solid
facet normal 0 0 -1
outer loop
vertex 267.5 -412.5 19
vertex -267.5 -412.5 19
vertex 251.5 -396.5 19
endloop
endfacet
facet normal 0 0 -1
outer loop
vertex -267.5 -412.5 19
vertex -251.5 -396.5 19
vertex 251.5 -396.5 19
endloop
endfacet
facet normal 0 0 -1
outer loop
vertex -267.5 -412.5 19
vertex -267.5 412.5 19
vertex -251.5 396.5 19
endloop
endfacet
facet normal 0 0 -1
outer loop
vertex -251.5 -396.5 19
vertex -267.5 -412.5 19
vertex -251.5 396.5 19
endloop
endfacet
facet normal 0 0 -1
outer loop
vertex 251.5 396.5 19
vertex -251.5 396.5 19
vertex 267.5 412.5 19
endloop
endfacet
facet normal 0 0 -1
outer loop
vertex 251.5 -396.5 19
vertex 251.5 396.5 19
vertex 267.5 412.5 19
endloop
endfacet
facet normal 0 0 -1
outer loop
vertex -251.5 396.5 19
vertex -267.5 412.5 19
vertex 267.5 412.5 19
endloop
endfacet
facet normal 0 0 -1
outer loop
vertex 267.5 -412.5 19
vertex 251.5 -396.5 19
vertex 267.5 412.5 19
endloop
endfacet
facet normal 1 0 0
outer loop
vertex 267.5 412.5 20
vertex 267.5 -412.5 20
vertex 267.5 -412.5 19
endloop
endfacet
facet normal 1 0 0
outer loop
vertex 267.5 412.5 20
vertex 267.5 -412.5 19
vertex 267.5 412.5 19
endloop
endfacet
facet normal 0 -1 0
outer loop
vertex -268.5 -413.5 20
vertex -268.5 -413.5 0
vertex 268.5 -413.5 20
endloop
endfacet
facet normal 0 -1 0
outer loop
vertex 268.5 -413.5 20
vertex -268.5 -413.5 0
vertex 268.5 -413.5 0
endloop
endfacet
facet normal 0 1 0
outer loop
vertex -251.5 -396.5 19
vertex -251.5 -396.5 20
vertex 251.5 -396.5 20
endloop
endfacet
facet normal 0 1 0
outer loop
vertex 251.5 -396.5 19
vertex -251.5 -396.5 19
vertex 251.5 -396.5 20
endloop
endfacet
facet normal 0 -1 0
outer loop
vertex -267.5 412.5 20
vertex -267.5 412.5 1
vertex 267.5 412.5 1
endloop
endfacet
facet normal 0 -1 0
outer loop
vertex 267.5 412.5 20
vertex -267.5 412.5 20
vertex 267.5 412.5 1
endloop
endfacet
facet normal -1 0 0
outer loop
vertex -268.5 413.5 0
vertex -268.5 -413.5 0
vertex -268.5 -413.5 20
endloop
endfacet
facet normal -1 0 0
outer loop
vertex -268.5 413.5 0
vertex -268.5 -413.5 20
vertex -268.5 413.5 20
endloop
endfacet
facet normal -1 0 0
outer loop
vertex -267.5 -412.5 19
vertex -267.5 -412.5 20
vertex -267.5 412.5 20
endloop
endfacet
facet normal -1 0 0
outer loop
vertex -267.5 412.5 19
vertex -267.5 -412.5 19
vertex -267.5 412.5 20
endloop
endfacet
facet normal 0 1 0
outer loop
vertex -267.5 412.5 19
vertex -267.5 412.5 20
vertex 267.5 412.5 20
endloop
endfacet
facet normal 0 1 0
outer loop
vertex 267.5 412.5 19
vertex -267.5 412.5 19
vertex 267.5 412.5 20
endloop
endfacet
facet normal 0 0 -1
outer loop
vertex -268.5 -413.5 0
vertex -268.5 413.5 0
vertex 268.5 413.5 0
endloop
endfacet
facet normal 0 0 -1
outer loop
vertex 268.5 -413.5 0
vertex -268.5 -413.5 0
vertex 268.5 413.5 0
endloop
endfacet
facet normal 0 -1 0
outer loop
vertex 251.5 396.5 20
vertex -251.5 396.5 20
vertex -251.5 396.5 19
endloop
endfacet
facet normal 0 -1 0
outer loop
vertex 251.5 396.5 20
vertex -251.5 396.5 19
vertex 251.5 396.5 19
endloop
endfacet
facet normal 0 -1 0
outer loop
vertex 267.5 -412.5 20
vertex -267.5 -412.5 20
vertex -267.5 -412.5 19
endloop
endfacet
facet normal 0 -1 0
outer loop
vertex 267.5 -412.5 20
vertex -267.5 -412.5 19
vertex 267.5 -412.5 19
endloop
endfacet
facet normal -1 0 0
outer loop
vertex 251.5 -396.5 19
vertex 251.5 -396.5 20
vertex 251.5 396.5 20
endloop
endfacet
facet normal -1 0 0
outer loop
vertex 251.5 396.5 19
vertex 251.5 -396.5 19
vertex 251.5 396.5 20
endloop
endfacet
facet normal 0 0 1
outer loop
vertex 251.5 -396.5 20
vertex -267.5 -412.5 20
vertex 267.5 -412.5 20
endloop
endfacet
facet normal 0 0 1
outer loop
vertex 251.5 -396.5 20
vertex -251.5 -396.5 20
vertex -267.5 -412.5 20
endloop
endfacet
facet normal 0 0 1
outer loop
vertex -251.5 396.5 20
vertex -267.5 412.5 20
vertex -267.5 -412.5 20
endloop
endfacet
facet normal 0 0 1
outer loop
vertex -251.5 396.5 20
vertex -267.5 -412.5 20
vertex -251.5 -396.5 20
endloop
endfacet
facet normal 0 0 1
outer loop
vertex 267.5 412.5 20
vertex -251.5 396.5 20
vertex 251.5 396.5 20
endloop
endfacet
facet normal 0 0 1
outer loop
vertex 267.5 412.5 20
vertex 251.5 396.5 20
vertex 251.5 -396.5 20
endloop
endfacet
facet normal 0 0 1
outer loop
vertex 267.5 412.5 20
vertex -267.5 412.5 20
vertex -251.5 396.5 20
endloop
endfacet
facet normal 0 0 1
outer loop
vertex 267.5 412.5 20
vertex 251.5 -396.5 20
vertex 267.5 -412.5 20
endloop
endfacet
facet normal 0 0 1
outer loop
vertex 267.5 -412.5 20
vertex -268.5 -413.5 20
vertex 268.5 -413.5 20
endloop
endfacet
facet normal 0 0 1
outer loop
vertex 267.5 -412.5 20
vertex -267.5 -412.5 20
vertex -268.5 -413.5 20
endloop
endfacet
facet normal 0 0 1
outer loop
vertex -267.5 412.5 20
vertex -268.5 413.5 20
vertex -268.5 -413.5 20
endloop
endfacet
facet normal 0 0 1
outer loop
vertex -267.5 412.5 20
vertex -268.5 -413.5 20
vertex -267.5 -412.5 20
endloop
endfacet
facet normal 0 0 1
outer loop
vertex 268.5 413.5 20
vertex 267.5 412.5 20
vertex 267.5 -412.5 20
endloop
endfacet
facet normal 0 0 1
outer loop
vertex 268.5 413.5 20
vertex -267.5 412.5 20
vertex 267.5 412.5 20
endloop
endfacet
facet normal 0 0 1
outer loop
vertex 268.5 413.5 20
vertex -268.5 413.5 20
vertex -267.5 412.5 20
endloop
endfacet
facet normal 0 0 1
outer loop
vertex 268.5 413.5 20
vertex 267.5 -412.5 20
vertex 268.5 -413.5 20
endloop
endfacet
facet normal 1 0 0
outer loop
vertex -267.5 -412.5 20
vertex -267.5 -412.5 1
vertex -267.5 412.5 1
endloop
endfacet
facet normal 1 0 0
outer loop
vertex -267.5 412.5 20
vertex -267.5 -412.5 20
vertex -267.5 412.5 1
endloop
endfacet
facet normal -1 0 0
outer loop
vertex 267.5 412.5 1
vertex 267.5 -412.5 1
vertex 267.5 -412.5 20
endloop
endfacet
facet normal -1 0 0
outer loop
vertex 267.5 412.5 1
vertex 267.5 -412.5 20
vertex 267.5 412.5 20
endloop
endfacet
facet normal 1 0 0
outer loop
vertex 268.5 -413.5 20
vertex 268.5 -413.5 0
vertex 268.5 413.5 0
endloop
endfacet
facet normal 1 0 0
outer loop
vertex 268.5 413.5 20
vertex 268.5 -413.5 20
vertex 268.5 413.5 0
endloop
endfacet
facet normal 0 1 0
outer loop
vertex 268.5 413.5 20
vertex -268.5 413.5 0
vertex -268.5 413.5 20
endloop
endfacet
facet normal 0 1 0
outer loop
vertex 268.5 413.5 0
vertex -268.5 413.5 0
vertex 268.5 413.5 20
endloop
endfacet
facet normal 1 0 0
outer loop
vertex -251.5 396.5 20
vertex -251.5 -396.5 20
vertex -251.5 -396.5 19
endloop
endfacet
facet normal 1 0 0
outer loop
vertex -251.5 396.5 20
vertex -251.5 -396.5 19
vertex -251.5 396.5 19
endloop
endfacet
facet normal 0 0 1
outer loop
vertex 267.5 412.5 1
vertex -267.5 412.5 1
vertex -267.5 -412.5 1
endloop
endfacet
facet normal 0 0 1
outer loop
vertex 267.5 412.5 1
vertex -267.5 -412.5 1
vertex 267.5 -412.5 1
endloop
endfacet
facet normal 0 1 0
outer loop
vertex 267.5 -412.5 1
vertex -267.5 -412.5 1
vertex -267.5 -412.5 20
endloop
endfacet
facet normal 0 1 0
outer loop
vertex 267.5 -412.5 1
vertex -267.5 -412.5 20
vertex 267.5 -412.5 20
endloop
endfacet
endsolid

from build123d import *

# Parameters (mm, degrees)
SKETCH_1_W      = 537
SKETCH_1_H      = 827
EXTRUDE_1_DEPTH = 20
SHELL_1_T       = -1
SKETCH_3_W      = 535
SKETCH_3_H      = 825
SKETCH_3_W_2    = 503
SKETCH_3_H_2    = 793
EXTRUDE_2_DEPTH = 1


with BuildPart() as part:
    # 草图1 → 凸台-拉伸1 (new body)
    with BuildSketch(Plane.XY):
        Rectangle(SKETCH_1_W, SKETCH_1_H)
    extrude(amount=EXTRUDE_1_DEPTH)

    # 抽壳1
    shell_1_openings = [part.faces().sort_by_distance(p)[0] for p in [
        (0, 0, 20),
    ]]
    offset(amount=SHELL_1_T, openings=shell_1_openings, kind=Kind.INTERSECTION)


with BuildPart() as body_2:
    # 草图3 → 凸台-拉伸2 (new body)
    with BuildSketch(Plane.XY.offset(20)):
        Rectangle(SKETCH_3_W, SKETCH_3_H)
        Rectangle(SKETCH_3_W_2, SKETCH_3_H_2, mode=Mode.SUBTRACT)
    extrude(amount=-EXTRUDE_2_DEPTH)


solid = Compound([part.part, body_2.part])
